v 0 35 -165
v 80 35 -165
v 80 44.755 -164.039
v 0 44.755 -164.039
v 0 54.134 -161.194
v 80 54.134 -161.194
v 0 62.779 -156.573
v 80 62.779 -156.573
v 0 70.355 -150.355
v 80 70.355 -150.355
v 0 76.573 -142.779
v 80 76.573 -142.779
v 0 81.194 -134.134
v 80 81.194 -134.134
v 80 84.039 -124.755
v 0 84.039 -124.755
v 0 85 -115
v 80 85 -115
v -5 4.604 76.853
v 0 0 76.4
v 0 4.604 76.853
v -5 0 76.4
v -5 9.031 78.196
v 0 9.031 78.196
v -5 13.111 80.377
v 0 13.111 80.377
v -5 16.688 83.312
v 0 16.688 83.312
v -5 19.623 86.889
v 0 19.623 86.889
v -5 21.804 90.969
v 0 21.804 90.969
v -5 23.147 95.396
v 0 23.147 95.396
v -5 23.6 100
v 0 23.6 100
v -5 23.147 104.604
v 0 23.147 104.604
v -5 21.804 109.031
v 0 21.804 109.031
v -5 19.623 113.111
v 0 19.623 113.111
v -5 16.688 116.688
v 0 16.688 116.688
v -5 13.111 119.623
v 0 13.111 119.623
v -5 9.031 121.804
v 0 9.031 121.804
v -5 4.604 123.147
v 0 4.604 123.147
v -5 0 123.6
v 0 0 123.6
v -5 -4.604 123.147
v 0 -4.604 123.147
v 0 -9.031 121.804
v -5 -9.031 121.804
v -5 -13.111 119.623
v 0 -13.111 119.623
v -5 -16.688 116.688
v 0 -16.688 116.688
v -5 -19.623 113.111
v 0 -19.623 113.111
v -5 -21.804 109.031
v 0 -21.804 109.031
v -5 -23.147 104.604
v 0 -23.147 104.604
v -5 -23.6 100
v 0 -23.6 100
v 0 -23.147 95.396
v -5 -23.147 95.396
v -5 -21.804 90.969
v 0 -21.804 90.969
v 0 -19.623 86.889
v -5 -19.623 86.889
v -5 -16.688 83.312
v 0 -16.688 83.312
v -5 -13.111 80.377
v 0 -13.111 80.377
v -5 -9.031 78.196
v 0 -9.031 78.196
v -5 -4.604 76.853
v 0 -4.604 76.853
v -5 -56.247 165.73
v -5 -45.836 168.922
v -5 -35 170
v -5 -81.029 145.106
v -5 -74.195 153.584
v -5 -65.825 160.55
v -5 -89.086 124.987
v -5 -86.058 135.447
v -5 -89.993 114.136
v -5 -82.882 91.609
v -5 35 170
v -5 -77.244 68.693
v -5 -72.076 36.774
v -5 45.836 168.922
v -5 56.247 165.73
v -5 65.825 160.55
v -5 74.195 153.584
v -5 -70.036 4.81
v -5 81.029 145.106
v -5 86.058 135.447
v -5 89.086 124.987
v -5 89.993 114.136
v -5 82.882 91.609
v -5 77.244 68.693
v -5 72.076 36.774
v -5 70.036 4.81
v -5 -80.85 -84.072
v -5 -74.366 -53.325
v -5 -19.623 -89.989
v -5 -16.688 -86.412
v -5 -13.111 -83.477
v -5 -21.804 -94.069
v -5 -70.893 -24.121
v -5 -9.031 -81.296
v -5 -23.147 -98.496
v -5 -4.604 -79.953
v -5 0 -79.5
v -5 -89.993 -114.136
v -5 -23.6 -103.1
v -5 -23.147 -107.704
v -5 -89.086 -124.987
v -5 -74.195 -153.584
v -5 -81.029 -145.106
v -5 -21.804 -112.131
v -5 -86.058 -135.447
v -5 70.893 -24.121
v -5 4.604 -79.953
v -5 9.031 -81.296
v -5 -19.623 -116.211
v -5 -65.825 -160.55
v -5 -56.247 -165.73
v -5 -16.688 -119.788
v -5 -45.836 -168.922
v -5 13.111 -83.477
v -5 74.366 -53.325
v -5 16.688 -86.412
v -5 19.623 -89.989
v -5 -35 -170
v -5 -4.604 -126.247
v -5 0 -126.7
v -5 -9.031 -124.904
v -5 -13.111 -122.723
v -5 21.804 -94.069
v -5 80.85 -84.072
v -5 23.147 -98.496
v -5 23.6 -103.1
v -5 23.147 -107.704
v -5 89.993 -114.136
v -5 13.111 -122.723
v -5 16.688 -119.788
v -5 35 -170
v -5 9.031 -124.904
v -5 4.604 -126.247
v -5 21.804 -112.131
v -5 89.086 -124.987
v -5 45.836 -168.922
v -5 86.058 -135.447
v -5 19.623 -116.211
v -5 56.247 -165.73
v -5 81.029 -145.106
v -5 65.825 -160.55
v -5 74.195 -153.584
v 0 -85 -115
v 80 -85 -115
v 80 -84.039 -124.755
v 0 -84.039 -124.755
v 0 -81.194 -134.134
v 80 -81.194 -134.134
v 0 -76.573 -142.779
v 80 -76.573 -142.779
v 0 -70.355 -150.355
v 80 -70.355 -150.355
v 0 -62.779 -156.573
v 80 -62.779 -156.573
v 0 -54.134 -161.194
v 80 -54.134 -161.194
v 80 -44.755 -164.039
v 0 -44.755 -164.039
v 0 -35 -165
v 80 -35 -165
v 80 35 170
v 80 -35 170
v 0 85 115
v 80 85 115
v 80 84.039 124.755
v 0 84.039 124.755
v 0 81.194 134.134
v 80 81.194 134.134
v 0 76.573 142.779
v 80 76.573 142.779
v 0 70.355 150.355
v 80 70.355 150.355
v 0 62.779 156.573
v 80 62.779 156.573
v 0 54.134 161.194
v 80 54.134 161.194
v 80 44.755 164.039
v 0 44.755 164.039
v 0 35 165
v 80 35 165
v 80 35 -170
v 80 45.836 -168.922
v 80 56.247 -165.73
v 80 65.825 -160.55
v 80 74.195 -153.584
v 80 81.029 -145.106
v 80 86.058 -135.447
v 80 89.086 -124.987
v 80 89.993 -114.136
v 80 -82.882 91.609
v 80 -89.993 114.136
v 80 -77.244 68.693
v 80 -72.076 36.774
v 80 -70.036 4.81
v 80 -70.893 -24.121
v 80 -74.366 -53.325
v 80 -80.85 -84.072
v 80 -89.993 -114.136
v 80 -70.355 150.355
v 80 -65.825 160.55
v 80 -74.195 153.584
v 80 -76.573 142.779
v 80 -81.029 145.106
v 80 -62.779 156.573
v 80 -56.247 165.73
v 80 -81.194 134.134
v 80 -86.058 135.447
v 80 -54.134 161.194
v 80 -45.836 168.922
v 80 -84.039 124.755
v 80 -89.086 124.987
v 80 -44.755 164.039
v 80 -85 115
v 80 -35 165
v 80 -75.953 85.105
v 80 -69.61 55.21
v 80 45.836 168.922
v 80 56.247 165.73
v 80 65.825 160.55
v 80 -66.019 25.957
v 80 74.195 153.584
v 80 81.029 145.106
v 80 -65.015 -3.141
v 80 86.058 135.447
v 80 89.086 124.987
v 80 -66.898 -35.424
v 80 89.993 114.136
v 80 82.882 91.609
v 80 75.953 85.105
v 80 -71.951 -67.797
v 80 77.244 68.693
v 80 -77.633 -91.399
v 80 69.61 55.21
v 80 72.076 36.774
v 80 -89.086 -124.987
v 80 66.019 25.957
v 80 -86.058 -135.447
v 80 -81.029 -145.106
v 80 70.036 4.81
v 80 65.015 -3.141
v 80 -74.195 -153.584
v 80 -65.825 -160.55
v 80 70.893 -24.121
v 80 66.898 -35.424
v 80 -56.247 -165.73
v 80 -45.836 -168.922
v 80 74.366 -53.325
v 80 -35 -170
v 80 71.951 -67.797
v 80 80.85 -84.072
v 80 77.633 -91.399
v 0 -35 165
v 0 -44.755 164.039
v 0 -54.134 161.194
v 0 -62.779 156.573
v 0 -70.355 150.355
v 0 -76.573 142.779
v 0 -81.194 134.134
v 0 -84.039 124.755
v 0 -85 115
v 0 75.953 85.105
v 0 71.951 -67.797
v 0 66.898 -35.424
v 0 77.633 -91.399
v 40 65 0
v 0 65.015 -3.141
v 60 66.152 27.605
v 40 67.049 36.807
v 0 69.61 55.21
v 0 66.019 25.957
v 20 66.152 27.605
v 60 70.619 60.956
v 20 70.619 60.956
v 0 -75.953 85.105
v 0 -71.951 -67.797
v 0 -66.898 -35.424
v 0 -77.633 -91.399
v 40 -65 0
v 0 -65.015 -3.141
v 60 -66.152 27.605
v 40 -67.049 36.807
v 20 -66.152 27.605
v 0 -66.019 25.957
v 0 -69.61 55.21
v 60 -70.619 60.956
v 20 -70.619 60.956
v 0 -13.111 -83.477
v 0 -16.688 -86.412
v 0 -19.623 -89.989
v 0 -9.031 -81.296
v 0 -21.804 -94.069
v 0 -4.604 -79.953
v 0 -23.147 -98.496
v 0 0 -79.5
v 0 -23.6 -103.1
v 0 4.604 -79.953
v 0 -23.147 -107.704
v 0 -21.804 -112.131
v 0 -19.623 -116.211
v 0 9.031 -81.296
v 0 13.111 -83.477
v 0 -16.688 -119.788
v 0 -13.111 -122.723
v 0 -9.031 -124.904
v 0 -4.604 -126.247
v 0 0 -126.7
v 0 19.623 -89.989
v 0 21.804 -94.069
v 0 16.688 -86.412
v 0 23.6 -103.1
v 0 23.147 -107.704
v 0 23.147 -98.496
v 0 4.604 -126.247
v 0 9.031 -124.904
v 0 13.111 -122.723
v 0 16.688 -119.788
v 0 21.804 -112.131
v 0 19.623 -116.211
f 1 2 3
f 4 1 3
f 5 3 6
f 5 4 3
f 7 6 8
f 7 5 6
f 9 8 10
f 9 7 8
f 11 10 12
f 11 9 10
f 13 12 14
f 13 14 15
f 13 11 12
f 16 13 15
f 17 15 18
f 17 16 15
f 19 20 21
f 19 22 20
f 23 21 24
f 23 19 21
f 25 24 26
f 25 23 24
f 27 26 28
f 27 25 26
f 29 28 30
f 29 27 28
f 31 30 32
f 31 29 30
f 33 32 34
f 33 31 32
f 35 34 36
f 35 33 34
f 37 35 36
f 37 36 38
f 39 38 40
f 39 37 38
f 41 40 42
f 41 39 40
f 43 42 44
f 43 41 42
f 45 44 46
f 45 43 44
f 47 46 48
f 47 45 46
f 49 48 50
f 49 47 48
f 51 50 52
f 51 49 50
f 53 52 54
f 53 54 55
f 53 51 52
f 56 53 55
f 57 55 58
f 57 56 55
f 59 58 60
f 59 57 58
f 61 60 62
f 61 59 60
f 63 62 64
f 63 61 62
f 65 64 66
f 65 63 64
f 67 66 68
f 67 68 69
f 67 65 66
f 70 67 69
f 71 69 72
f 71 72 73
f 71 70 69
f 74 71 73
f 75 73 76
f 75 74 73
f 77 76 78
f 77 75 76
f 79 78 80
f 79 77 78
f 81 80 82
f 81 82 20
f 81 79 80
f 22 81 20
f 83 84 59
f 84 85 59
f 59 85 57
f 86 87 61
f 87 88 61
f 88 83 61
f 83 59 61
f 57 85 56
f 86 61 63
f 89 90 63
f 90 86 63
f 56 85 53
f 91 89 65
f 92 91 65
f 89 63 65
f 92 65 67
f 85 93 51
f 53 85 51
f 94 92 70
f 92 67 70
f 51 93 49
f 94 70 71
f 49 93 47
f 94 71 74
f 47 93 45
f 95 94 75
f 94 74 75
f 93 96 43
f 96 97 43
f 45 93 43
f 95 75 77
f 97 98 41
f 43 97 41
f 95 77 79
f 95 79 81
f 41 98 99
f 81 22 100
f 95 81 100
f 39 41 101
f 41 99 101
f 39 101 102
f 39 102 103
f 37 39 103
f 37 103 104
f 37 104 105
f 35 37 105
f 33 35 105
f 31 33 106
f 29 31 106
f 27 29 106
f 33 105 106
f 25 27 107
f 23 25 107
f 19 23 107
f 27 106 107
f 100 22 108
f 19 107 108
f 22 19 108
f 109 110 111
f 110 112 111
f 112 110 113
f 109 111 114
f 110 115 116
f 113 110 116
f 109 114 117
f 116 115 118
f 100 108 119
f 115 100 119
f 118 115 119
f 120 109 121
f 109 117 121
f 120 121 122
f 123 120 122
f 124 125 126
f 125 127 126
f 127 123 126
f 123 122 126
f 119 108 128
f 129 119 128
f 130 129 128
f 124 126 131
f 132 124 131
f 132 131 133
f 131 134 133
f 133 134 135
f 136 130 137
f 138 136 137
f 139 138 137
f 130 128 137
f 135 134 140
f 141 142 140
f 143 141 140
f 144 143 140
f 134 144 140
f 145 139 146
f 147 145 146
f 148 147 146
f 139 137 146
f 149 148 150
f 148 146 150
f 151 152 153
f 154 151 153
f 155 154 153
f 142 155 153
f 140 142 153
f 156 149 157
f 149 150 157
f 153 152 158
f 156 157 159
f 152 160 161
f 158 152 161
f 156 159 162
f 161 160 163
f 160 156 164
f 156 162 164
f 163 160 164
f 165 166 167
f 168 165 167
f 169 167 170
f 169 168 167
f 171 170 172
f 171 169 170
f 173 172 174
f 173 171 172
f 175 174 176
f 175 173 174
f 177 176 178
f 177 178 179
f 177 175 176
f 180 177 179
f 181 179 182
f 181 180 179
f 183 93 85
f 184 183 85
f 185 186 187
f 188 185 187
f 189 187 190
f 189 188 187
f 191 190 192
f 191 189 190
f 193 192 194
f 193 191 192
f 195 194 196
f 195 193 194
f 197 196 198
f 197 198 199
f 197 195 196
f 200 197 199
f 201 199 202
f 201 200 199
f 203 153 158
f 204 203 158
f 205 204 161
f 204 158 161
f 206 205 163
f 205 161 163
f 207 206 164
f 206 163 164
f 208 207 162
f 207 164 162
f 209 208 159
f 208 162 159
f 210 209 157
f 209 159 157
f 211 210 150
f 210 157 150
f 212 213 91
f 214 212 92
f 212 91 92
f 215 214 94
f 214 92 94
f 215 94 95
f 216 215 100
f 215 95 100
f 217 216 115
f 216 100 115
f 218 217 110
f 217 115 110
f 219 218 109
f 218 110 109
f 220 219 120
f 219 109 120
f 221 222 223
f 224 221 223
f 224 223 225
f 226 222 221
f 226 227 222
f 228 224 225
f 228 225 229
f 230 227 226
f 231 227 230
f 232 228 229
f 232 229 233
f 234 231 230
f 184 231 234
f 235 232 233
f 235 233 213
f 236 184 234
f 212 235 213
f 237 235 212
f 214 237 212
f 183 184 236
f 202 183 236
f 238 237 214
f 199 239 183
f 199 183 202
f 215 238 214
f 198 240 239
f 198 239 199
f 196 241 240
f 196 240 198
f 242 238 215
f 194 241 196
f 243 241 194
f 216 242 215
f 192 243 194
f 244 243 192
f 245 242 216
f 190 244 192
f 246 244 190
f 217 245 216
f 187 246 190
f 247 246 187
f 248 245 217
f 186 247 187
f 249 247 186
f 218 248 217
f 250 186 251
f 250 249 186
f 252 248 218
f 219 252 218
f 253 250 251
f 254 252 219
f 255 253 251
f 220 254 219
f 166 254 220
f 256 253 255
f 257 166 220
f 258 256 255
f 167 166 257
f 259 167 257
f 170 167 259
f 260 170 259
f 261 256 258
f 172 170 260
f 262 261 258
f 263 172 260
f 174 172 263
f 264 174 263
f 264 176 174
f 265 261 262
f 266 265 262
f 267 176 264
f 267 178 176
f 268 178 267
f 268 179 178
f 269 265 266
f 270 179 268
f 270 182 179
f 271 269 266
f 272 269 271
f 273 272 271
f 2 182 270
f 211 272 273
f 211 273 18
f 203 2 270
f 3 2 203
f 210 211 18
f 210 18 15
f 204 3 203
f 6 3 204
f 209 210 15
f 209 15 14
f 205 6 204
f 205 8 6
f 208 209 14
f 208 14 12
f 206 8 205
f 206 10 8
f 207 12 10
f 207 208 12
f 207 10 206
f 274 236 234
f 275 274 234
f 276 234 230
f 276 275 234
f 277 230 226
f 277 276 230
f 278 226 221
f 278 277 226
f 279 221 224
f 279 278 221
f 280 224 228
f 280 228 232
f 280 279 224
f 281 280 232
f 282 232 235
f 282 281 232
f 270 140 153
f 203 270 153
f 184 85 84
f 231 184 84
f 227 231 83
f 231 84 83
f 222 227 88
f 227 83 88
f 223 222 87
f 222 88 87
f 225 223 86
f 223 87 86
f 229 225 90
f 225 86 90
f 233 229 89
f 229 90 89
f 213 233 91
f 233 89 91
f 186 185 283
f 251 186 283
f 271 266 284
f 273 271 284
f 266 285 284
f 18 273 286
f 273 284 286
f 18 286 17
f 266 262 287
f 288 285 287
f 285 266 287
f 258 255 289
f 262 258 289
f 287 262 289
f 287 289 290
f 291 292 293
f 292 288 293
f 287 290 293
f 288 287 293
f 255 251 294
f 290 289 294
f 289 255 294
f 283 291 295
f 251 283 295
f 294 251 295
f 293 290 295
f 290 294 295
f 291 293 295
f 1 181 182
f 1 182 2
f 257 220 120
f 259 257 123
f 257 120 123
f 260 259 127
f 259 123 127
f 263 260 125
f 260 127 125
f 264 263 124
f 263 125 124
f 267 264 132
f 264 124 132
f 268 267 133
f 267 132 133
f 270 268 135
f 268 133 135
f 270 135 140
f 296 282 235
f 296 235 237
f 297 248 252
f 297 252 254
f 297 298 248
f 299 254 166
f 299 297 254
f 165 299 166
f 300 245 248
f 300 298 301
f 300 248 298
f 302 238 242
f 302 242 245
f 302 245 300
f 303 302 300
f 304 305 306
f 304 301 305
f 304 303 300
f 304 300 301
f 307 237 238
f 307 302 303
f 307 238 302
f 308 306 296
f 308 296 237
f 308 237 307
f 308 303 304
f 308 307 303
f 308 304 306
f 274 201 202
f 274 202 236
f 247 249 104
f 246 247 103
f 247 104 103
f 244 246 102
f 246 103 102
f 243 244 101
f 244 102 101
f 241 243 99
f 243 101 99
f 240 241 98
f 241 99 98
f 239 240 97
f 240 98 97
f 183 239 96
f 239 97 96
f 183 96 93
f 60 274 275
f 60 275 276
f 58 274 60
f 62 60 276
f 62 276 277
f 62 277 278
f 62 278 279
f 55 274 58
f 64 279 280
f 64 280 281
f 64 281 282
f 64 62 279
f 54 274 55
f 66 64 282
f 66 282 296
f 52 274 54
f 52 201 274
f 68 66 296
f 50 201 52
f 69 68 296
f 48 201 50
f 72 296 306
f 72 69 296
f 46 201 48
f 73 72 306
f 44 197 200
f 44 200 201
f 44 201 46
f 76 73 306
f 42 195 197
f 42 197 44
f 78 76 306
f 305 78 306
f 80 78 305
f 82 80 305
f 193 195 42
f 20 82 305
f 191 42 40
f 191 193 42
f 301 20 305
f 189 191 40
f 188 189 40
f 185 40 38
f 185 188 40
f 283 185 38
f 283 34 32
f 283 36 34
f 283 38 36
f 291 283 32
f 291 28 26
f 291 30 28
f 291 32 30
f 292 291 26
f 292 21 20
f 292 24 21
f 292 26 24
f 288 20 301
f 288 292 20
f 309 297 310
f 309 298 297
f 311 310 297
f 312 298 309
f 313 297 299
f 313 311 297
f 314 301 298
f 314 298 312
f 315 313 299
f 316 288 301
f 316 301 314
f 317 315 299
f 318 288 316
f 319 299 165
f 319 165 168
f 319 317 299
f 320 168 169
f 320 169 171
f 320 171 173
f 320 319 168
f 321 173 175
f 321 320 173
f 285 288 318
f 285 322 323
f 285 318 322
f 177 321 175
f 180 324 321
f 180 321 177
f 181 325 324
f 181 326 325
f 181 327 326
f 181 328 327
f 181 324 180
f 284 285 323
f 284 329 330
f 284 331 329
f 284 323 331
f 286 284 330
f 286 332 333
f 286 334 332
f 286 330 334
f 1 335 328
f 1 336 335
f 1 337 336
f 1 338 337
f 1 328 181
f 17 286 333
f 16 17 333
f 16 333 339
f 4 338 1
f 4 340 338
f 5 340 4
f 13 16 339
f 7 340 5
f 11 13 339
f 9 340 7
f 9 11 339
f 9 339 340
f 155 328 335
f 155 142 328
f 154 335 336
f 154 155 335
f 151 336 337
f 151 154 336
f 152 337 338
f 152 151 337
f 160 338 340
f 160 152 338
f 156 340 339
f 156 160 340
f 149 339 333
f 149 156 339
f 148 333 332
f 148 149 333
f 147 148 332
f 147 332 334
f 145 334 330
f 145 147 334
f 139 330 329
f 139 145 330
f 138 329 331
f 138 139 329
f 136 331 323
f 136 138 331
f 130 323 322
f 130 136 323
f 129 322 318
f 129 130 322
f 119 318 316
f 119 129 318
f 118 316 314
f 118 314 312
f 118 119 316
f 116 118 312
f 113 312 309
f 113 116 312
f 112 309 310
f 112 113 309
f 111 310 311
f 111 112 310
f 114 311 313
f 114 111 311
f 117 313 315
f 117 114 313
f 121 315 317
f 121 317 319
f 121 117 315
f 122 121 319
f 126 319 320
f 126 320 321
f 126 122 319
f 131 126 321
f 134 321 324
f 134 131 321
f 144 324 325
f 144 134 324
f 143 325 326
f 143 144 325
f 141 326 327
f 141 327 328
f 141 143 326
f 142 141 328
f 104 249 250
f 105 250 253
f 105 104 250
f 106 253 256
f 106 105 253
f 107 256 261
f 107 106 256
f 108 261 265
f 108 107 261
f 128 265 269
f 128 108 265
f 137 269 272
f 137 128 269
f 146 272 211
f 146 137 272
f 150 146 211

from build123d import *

# Parameters (mm, degrees)
CROQUIS1_R              = 23.6
SALIENTE_EXTRUIR1_DEPTH = 80
VACIADO1_T              = 5
CORTAR_EXTRUIR1_START   = -214
CROQUIS2_R              = 23.6
CORTAR_EXTRUIR1_DEPTH   = 214


with BuildPart() as part:
    # Croquis1 → Saliente-Extruir1 (new body)
    with BuildSketch(Plane(origin=(0, 0, 0), x_dir=(0, 0, -1), z_dir=(1, 0, 0))):
        with BuildLine():
            Line((165, -35), (165, 35))
            ThreePointArc((165, 35), (150.355339059, 70.355339059), (115, 85))
            add(Edge.make_bspline(
                [(-115, 85), (0, 45), (115, 85)],
                knots=[0, 0, 0, 1, 1, 1], degree=2))
            ThreePointArc((-115, 85), (-150.355339059, 70.355339059), (-165, 35))
            Line((-165, 35), (-165, -35))
            ThreePointArc((-165, -35), (-150.355339059, -70.355339059), (-115, -85))
            add(Edge.make_bspline(
                [(-115, -85), (0, -45), (115, -85)],
                knots=[0, 0, 0, 1, 1, 1], degree=2))
            ThreePointArc((115, -85), (150.355339059, -70.355339059), (165, -35))
        make_face()
        with Locations((-100, 0)):
            Circle(CROQUIS1_R, mode=Mode.SUBTRACT)
        with Locations((103.1, 0)):
            Circle(CROQUIS1_R, mode=Mode.SUBTRACT)
    extrude(amount=SALIENTE_EXTRUIR1_DEPTH)

    # Vaciado1
    vaciado1_openings = [part.faces().sort_by_distance(p)[0] for p in [
        (80, 0, 0.122383932),
    ]]
    offset(amount=VACIADO1_T, openings=vaciado1_openings, kind=Kind.INTERSECTION)

    # Croquis2 → Cortar-Extruir1 (cut)
    with BuildSketch(Plane(origin=(80, 0, 0), x_dir=(0, 0, -1), z_dir=(1, 0, 0)).offset(CORTAR_EXTRUIR1_START)):
        with Locations((-100, 0)):
            Circle(CROQUIS2_R)
        with Locations((103.1, 0)):
            Circle(CROQUIS2_R)
    extrude(amount=CORTAR_EXTRUIR1_DEPTH, mode=Mode.SUBTRACT)


solid = part.part
